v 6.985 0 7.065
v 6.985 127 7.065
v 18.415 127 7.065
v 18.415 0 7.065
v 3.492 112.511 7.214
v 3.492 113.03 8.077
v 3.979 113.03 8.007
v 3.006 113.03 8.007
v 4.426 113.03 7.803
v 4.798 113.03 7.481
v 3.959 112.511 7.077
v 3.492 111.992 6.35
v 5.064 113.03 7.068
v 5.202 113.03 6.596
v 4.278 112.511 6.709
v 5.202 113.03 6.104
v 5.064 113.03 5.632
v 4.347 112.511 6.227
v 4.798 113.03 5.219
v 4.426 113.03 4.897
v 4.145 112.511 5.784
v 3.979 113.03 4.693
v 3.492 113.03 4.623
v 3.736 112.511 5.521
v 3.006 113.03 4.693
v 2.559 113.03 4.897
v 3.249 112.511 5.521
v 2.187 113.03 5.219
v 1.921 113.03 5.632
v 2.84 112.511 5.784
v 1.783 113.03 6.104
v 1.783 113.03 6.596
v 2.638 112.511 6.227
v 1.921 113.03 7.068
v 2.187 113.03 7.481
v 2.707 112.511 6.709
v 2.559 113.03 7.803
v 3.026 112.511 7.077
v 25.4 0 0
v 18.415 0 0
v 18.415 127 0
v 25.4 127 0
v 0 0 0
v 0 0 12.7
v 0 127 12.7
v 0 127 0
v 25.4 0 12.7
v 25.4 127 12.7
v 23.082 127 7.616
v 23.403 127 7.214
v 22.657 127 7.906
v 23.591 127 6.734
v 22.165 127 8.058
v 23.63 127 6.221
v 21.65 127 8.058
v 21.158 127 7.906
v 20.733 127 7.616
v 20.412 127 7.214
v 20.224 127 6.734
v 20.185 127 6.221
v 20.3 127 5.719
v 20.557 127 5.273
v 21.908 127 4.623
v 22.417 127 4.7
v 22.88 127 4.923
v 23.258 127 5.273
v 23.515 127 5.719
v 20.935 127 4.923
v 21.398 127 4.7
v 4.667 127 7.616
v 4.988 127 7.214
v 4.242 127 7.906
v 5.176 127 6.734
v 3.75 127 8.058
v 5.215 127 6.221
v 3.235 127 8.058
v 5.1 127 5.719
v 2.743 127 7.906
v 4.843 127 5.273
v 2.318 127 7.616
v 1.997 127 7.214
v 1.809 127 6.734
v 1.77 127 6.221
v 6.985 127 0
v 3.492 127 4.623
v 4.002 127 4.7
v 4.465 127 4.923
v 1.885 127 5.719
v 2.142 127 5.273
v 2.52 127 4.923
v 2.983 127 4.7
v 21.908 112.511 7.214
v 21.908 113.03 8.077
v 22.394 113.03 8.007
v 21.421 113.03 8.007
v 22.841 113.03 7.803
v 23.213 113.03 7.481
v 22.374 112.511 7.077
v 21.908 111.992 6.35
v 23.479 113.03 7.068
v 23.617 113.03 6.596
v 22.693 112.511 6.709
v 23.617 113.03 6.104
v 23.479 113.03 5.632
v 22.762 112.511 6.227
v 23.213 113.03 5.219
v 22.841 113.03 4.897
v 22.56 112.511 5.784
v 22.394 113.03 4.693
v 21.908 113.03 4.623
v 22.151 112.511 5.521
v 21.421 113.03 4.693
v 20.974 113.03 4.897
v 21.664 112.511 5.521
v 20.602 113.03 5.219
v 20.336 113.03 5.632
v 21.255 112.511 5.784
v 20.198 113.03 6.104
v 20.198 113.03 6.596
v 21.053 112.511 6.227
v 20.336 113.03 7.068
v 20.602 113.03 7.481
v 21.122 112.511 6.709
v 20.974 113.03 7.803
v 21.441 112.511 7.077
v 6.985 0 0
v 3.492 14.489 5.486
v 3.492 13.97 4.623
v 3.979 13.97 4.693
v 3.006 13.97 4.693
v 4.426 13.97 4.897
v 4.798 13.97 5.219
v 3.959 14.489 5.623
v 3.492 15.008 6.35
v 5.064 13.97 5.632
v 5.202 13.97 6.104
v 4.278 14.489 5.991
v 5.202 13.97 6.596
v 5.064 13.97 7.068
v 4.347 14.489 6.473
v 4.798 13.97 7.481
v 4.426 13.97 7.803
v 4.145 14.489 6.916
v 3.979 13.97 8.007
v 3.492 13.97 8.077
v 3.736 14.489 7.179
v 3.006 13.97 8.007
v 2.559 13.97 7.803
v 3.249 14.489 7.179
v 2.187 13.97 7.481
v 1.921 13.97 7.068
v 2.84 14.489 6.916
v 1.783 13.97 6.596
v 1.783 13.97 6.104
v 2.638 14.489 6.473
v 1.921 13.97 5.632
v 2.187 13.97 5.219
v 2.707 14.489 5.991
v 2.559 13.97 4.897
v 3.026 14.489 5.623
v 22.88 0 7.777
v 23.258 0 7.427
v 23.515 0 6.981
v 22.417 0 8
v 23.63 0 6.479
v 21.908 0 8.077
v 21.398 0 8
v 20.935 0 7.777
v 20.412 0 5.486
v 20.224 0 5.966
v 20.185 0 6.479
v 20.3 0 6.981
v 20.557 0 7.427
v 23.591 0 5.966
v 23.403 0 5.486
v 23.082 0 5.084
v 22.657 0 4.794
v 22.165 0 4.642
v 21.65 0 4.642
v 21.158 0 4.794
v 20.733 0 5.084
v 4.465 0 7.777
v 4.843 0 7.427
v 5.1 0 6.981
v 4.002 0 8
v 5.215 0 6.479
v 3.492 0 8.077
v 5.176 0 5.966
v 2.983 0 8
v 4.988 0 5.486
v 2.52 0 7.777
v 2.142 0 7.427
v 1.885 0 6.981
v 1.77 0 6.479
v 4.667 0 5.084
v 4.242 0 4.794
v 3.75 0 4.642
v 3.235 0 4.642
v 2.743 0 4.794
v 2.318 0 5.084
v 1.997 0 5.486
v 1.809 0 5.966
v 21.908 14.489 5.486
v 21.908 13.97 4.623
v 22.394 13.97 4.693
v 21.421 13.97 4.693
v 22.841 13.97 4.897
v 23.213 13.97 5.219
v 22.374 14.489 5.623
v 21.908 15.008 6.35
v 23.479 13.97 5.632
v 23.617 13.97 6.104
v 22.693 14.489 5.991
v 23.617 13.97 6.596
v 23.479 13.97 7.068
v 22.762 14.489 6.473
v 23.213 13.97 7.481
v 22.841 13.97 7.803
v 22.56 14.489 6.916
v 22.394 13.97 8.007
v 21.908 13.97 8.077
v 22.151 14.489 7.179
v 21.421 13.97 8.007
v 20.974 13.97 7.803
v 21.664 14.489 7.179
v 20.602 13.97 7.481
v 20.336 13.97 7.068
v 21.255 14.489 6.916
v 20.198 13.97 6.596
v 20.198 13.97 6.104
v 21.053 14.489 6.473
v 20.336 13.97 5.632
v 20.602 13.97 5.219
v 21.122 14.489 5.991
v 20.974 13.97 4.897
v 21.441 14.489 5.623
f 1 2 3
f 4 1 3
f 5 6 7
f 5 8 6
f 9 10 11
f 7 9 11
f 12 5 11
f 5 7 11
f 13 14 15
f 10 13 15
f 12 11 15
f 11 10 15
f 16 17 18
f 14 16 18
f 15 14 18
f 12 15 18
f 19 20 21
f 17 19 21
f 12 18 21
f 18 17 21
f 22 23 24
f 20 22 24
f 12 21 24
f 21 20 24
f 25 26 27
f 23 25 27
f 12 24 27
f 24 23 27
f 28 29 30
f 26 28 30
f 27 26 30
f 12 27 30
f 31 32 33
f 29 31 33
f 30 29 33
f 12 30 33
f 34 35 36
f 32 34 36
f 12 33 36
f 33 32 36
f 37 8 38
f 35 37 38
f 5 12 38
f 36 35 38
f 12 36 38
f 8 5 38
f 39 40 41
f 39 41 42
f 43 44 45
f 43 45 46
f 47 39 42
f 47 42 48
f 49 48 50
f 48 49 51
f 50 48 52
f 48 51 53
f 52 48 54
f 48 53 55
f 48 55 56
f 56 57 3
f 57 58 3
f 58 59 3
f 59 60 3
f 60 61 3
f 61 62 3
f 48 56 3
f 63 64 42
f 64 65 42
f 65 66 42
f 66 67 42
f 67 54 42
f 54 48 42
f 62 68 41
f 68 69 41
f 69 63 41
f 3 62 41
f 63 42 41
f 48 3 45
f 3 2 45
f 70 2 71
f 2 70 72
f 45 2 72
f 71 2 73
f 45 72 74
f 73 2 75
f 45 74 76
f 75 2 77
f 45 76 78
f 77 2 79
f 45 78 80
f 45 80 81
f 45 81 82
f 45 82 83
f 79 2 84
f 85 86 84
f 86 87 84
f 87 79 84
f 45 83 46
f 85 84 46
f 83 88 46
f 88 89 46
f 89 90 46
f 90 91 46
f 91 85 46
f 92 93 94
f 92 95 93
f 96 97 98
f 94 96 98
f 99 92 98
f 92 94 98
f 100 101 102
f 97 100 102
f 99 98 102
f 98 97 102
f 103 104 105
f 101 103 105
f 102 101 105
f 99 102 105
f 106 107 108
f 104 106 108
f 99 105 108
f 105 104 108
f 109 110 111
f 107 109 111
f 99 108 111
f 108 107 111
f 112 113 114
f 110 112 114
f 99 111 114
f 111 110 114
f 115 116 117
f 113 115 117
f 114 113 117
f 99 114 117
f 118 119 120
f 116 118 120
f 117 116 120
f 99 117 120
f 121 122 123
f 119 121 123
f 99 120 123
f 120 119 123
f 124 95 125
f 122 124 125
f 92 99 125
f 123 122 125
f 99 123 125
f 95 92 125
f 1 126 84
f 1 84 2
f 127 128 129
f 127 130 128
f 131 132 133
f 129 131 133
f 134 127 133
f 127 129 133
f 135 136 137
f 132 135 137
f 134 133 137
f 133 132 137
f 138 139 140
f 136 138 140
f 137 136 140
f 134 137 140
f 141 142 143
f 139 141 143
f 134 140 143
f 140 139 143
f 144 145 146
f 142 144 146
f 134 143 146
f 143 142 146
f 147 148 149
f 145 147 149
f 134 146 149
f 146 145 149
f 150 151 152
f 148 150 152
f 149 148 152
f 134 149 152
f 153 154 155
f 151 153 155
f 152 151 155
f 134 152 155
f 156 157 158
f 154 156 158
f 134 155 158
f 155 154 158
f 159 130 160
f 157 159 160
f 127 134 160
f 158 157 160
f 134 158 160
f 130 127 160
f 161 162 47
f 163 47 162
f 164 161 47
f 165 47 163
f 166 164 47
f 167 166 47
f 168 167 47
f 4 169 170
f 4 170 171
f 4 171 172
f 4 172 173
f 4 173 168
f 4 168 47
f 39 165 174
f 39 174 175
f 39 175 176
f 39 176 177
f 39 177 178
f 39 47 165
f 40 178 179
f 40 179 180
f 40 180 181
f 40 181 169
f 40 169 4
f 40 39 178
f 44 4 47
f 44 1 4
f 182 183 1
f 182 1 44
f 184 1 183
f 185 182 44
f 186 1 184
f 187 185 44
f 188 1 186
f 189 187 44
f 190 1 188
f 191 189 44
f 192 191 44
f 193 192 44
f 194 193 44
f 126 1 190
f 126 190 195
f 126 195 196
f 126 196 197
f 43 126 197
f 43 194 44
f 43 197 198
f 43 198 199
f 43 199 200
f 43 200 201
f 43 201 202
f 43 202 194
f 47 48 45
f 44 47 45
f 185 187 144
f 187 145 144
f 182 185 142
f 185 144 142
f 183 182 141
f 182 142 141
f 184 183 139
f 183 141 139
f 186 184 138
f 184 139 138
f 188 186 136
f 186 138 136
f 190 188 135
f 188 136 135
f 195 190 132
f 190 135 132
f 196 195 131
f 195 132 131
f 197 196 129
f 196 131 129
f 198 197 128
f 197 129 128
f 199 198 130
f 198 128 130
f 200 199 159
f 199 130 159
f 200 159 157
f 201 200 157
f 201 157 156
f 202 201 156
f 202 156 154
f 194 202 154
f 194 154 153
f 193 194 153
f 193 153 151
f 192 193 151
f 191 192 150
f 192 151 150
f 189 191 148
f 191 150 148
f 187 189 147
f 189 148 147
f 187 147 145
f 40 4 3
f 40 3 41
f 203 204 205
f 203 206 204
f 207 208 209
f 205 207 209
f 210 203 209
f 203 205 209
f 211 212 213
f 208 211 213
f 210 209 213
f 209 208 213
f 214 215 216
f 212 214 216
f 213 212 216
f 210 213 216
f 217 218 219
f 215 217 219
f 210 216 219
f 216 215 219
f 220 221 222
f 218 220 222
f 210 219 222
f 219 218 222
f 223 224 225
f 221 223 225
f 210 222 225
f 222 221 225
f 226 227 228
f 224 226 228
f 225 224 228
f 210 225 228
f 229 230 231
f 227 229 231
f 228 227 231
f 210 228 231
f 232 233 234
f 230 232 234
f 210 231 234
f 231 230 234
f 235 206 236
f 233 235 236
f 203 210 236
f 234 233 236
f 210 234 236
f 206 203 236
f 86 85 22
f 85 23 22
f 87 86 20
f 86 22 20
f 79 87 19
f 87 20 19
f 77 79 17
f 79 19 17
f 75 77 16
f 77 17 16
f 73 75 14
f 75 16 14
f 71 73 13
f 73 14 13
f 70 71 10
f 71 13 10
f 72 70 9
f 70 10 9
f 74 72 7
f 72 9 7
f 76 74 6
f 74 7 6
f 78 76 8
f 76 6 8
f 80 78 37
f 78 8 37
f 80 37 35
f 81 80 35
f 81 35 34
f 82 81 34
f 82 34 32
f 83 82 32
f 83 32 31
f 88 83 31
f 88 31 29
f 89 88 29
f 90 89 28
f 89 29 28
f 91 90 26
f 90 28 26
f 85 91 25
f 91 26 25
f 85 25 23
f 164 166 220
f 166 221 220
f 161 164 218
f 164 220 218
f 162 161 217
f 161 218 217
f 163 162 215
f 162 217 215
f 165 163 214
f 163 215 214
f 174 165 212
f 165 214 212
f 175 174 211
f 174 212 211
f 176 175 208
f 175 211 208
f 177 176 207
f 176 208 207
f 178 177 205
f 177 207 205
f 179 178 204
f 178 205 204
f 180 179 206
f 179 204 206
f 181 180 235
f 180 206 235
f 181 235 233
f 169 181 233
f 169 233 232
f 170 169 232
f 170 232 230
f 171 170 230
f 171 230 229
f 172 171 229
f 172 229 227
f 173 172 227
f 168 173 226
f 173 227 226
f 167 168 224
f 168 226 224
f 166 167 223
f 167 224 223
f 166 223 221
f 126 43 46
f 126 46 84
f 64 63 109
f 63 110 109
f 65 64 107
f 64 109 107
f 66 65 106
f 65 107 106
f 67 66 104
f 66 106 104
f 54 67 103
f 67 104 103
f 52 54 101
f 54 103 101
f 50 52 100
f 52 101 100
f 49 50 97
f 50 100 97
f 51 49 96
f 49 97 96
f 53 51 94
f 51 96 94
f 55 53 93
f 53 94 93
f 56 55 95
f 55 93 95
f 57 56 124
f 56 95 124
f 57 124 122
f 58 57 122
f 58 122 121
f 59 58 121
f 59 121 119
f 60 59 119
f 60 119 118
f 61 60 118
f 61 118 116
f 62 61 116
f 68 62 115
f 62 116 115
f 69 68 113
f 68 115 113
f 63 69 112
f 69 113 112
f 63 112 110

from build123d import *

# Parameters (mm, degrees)
BOSS_EXTRUDE1_DEPTH           = 127
TAP_DRILL_FOR_8_32_TAP2_D     = 3.4544
TAP_DRILL_FOR_8_32_TAP2_DEPTH = 13.97
TAP_DRILL_FOR_8_32_TAP2_TIP   = 1.037806461
TAP_DRILL_FOR_8_32_TAP3_D     = 3.4544
TAP_DRILL_FOR_8_32_TAP3_DEPTH = 13.97
TAP_DRILL_FOR_8_32_TAP3_TIP   = 1.037806461


with BuildPart() as part:
    # Sketch1 → Boss-Extrude1 (new body)
    with BuildSketch(Plane(origin=(0, 0, 0), x_dir=(1, 0, 0), z_dir=(0, 1, 0))):
        Polygon((18.415, 0), (25.4, 0), (25.4, -12.7), (0, -12.7), (0, 0), (6.985, 0), (6.985, -7.065187713), (18.415, -7.065187713), align=None)
    extrude(amount=BOSS_EXTRUDE1_DEPTH)

    # Tap Drill for #8-32 Tap2
    with Locations(Plane(origin=(3.4925, 0, 6.35), x_dir=(0, 0, -1), z_dir=(0, -1, 0))):
        with Locations((0, 0), (0, 18.415)):
            Hole(TAP_DRILL_FOR_8_32_TAP2_D / 2, depth=TAP_DRILL_FOR_8_32_TAP2_DEPTH)
            with Locations((0, 0, -(TAP_DRILL_FOR_8_32_TAP2_DEPTH + TAP_DRILL_FOR_8_32_TAP2_TIP / 2))):  # 118° drill point
                Cone(0, TAP_DRILL_FOR_8_32_TAP2_D / 2, TAP_DRILL_FOR_8_32_TAP2_TIP, mode=Mode.SUBTRACT)

    # Tap Drill for #8-32 Tap3
    with Locations(Plane(origin=(3.4925, 127, 6.35), x_dir=(0, 0, 1), z_dir=(0, 1, 0))):
        with Locations((0, 0), (0, 18.415)):
            Hole(TAP_DRILL_FOR_8_32_TAP3_D / 2, depth=TAP_DRILL_FOR_8_32_TAP3_DEPTH)
            with Locations((0, 0, -(TAP_DRILL_FOR_8_32_TAP3_DEPTH + TAP_DRILL_FOR_8_32_TAP3_TIP / 2))):  # 118° drill point
                Cone(0, TAP_DRILL_FOR_8_32_TAP3_D / 2, TAP_DRILL_FOR_8_32_TAP3_TIP, mode=Mode.SUBTRACT)


solid = part.part
